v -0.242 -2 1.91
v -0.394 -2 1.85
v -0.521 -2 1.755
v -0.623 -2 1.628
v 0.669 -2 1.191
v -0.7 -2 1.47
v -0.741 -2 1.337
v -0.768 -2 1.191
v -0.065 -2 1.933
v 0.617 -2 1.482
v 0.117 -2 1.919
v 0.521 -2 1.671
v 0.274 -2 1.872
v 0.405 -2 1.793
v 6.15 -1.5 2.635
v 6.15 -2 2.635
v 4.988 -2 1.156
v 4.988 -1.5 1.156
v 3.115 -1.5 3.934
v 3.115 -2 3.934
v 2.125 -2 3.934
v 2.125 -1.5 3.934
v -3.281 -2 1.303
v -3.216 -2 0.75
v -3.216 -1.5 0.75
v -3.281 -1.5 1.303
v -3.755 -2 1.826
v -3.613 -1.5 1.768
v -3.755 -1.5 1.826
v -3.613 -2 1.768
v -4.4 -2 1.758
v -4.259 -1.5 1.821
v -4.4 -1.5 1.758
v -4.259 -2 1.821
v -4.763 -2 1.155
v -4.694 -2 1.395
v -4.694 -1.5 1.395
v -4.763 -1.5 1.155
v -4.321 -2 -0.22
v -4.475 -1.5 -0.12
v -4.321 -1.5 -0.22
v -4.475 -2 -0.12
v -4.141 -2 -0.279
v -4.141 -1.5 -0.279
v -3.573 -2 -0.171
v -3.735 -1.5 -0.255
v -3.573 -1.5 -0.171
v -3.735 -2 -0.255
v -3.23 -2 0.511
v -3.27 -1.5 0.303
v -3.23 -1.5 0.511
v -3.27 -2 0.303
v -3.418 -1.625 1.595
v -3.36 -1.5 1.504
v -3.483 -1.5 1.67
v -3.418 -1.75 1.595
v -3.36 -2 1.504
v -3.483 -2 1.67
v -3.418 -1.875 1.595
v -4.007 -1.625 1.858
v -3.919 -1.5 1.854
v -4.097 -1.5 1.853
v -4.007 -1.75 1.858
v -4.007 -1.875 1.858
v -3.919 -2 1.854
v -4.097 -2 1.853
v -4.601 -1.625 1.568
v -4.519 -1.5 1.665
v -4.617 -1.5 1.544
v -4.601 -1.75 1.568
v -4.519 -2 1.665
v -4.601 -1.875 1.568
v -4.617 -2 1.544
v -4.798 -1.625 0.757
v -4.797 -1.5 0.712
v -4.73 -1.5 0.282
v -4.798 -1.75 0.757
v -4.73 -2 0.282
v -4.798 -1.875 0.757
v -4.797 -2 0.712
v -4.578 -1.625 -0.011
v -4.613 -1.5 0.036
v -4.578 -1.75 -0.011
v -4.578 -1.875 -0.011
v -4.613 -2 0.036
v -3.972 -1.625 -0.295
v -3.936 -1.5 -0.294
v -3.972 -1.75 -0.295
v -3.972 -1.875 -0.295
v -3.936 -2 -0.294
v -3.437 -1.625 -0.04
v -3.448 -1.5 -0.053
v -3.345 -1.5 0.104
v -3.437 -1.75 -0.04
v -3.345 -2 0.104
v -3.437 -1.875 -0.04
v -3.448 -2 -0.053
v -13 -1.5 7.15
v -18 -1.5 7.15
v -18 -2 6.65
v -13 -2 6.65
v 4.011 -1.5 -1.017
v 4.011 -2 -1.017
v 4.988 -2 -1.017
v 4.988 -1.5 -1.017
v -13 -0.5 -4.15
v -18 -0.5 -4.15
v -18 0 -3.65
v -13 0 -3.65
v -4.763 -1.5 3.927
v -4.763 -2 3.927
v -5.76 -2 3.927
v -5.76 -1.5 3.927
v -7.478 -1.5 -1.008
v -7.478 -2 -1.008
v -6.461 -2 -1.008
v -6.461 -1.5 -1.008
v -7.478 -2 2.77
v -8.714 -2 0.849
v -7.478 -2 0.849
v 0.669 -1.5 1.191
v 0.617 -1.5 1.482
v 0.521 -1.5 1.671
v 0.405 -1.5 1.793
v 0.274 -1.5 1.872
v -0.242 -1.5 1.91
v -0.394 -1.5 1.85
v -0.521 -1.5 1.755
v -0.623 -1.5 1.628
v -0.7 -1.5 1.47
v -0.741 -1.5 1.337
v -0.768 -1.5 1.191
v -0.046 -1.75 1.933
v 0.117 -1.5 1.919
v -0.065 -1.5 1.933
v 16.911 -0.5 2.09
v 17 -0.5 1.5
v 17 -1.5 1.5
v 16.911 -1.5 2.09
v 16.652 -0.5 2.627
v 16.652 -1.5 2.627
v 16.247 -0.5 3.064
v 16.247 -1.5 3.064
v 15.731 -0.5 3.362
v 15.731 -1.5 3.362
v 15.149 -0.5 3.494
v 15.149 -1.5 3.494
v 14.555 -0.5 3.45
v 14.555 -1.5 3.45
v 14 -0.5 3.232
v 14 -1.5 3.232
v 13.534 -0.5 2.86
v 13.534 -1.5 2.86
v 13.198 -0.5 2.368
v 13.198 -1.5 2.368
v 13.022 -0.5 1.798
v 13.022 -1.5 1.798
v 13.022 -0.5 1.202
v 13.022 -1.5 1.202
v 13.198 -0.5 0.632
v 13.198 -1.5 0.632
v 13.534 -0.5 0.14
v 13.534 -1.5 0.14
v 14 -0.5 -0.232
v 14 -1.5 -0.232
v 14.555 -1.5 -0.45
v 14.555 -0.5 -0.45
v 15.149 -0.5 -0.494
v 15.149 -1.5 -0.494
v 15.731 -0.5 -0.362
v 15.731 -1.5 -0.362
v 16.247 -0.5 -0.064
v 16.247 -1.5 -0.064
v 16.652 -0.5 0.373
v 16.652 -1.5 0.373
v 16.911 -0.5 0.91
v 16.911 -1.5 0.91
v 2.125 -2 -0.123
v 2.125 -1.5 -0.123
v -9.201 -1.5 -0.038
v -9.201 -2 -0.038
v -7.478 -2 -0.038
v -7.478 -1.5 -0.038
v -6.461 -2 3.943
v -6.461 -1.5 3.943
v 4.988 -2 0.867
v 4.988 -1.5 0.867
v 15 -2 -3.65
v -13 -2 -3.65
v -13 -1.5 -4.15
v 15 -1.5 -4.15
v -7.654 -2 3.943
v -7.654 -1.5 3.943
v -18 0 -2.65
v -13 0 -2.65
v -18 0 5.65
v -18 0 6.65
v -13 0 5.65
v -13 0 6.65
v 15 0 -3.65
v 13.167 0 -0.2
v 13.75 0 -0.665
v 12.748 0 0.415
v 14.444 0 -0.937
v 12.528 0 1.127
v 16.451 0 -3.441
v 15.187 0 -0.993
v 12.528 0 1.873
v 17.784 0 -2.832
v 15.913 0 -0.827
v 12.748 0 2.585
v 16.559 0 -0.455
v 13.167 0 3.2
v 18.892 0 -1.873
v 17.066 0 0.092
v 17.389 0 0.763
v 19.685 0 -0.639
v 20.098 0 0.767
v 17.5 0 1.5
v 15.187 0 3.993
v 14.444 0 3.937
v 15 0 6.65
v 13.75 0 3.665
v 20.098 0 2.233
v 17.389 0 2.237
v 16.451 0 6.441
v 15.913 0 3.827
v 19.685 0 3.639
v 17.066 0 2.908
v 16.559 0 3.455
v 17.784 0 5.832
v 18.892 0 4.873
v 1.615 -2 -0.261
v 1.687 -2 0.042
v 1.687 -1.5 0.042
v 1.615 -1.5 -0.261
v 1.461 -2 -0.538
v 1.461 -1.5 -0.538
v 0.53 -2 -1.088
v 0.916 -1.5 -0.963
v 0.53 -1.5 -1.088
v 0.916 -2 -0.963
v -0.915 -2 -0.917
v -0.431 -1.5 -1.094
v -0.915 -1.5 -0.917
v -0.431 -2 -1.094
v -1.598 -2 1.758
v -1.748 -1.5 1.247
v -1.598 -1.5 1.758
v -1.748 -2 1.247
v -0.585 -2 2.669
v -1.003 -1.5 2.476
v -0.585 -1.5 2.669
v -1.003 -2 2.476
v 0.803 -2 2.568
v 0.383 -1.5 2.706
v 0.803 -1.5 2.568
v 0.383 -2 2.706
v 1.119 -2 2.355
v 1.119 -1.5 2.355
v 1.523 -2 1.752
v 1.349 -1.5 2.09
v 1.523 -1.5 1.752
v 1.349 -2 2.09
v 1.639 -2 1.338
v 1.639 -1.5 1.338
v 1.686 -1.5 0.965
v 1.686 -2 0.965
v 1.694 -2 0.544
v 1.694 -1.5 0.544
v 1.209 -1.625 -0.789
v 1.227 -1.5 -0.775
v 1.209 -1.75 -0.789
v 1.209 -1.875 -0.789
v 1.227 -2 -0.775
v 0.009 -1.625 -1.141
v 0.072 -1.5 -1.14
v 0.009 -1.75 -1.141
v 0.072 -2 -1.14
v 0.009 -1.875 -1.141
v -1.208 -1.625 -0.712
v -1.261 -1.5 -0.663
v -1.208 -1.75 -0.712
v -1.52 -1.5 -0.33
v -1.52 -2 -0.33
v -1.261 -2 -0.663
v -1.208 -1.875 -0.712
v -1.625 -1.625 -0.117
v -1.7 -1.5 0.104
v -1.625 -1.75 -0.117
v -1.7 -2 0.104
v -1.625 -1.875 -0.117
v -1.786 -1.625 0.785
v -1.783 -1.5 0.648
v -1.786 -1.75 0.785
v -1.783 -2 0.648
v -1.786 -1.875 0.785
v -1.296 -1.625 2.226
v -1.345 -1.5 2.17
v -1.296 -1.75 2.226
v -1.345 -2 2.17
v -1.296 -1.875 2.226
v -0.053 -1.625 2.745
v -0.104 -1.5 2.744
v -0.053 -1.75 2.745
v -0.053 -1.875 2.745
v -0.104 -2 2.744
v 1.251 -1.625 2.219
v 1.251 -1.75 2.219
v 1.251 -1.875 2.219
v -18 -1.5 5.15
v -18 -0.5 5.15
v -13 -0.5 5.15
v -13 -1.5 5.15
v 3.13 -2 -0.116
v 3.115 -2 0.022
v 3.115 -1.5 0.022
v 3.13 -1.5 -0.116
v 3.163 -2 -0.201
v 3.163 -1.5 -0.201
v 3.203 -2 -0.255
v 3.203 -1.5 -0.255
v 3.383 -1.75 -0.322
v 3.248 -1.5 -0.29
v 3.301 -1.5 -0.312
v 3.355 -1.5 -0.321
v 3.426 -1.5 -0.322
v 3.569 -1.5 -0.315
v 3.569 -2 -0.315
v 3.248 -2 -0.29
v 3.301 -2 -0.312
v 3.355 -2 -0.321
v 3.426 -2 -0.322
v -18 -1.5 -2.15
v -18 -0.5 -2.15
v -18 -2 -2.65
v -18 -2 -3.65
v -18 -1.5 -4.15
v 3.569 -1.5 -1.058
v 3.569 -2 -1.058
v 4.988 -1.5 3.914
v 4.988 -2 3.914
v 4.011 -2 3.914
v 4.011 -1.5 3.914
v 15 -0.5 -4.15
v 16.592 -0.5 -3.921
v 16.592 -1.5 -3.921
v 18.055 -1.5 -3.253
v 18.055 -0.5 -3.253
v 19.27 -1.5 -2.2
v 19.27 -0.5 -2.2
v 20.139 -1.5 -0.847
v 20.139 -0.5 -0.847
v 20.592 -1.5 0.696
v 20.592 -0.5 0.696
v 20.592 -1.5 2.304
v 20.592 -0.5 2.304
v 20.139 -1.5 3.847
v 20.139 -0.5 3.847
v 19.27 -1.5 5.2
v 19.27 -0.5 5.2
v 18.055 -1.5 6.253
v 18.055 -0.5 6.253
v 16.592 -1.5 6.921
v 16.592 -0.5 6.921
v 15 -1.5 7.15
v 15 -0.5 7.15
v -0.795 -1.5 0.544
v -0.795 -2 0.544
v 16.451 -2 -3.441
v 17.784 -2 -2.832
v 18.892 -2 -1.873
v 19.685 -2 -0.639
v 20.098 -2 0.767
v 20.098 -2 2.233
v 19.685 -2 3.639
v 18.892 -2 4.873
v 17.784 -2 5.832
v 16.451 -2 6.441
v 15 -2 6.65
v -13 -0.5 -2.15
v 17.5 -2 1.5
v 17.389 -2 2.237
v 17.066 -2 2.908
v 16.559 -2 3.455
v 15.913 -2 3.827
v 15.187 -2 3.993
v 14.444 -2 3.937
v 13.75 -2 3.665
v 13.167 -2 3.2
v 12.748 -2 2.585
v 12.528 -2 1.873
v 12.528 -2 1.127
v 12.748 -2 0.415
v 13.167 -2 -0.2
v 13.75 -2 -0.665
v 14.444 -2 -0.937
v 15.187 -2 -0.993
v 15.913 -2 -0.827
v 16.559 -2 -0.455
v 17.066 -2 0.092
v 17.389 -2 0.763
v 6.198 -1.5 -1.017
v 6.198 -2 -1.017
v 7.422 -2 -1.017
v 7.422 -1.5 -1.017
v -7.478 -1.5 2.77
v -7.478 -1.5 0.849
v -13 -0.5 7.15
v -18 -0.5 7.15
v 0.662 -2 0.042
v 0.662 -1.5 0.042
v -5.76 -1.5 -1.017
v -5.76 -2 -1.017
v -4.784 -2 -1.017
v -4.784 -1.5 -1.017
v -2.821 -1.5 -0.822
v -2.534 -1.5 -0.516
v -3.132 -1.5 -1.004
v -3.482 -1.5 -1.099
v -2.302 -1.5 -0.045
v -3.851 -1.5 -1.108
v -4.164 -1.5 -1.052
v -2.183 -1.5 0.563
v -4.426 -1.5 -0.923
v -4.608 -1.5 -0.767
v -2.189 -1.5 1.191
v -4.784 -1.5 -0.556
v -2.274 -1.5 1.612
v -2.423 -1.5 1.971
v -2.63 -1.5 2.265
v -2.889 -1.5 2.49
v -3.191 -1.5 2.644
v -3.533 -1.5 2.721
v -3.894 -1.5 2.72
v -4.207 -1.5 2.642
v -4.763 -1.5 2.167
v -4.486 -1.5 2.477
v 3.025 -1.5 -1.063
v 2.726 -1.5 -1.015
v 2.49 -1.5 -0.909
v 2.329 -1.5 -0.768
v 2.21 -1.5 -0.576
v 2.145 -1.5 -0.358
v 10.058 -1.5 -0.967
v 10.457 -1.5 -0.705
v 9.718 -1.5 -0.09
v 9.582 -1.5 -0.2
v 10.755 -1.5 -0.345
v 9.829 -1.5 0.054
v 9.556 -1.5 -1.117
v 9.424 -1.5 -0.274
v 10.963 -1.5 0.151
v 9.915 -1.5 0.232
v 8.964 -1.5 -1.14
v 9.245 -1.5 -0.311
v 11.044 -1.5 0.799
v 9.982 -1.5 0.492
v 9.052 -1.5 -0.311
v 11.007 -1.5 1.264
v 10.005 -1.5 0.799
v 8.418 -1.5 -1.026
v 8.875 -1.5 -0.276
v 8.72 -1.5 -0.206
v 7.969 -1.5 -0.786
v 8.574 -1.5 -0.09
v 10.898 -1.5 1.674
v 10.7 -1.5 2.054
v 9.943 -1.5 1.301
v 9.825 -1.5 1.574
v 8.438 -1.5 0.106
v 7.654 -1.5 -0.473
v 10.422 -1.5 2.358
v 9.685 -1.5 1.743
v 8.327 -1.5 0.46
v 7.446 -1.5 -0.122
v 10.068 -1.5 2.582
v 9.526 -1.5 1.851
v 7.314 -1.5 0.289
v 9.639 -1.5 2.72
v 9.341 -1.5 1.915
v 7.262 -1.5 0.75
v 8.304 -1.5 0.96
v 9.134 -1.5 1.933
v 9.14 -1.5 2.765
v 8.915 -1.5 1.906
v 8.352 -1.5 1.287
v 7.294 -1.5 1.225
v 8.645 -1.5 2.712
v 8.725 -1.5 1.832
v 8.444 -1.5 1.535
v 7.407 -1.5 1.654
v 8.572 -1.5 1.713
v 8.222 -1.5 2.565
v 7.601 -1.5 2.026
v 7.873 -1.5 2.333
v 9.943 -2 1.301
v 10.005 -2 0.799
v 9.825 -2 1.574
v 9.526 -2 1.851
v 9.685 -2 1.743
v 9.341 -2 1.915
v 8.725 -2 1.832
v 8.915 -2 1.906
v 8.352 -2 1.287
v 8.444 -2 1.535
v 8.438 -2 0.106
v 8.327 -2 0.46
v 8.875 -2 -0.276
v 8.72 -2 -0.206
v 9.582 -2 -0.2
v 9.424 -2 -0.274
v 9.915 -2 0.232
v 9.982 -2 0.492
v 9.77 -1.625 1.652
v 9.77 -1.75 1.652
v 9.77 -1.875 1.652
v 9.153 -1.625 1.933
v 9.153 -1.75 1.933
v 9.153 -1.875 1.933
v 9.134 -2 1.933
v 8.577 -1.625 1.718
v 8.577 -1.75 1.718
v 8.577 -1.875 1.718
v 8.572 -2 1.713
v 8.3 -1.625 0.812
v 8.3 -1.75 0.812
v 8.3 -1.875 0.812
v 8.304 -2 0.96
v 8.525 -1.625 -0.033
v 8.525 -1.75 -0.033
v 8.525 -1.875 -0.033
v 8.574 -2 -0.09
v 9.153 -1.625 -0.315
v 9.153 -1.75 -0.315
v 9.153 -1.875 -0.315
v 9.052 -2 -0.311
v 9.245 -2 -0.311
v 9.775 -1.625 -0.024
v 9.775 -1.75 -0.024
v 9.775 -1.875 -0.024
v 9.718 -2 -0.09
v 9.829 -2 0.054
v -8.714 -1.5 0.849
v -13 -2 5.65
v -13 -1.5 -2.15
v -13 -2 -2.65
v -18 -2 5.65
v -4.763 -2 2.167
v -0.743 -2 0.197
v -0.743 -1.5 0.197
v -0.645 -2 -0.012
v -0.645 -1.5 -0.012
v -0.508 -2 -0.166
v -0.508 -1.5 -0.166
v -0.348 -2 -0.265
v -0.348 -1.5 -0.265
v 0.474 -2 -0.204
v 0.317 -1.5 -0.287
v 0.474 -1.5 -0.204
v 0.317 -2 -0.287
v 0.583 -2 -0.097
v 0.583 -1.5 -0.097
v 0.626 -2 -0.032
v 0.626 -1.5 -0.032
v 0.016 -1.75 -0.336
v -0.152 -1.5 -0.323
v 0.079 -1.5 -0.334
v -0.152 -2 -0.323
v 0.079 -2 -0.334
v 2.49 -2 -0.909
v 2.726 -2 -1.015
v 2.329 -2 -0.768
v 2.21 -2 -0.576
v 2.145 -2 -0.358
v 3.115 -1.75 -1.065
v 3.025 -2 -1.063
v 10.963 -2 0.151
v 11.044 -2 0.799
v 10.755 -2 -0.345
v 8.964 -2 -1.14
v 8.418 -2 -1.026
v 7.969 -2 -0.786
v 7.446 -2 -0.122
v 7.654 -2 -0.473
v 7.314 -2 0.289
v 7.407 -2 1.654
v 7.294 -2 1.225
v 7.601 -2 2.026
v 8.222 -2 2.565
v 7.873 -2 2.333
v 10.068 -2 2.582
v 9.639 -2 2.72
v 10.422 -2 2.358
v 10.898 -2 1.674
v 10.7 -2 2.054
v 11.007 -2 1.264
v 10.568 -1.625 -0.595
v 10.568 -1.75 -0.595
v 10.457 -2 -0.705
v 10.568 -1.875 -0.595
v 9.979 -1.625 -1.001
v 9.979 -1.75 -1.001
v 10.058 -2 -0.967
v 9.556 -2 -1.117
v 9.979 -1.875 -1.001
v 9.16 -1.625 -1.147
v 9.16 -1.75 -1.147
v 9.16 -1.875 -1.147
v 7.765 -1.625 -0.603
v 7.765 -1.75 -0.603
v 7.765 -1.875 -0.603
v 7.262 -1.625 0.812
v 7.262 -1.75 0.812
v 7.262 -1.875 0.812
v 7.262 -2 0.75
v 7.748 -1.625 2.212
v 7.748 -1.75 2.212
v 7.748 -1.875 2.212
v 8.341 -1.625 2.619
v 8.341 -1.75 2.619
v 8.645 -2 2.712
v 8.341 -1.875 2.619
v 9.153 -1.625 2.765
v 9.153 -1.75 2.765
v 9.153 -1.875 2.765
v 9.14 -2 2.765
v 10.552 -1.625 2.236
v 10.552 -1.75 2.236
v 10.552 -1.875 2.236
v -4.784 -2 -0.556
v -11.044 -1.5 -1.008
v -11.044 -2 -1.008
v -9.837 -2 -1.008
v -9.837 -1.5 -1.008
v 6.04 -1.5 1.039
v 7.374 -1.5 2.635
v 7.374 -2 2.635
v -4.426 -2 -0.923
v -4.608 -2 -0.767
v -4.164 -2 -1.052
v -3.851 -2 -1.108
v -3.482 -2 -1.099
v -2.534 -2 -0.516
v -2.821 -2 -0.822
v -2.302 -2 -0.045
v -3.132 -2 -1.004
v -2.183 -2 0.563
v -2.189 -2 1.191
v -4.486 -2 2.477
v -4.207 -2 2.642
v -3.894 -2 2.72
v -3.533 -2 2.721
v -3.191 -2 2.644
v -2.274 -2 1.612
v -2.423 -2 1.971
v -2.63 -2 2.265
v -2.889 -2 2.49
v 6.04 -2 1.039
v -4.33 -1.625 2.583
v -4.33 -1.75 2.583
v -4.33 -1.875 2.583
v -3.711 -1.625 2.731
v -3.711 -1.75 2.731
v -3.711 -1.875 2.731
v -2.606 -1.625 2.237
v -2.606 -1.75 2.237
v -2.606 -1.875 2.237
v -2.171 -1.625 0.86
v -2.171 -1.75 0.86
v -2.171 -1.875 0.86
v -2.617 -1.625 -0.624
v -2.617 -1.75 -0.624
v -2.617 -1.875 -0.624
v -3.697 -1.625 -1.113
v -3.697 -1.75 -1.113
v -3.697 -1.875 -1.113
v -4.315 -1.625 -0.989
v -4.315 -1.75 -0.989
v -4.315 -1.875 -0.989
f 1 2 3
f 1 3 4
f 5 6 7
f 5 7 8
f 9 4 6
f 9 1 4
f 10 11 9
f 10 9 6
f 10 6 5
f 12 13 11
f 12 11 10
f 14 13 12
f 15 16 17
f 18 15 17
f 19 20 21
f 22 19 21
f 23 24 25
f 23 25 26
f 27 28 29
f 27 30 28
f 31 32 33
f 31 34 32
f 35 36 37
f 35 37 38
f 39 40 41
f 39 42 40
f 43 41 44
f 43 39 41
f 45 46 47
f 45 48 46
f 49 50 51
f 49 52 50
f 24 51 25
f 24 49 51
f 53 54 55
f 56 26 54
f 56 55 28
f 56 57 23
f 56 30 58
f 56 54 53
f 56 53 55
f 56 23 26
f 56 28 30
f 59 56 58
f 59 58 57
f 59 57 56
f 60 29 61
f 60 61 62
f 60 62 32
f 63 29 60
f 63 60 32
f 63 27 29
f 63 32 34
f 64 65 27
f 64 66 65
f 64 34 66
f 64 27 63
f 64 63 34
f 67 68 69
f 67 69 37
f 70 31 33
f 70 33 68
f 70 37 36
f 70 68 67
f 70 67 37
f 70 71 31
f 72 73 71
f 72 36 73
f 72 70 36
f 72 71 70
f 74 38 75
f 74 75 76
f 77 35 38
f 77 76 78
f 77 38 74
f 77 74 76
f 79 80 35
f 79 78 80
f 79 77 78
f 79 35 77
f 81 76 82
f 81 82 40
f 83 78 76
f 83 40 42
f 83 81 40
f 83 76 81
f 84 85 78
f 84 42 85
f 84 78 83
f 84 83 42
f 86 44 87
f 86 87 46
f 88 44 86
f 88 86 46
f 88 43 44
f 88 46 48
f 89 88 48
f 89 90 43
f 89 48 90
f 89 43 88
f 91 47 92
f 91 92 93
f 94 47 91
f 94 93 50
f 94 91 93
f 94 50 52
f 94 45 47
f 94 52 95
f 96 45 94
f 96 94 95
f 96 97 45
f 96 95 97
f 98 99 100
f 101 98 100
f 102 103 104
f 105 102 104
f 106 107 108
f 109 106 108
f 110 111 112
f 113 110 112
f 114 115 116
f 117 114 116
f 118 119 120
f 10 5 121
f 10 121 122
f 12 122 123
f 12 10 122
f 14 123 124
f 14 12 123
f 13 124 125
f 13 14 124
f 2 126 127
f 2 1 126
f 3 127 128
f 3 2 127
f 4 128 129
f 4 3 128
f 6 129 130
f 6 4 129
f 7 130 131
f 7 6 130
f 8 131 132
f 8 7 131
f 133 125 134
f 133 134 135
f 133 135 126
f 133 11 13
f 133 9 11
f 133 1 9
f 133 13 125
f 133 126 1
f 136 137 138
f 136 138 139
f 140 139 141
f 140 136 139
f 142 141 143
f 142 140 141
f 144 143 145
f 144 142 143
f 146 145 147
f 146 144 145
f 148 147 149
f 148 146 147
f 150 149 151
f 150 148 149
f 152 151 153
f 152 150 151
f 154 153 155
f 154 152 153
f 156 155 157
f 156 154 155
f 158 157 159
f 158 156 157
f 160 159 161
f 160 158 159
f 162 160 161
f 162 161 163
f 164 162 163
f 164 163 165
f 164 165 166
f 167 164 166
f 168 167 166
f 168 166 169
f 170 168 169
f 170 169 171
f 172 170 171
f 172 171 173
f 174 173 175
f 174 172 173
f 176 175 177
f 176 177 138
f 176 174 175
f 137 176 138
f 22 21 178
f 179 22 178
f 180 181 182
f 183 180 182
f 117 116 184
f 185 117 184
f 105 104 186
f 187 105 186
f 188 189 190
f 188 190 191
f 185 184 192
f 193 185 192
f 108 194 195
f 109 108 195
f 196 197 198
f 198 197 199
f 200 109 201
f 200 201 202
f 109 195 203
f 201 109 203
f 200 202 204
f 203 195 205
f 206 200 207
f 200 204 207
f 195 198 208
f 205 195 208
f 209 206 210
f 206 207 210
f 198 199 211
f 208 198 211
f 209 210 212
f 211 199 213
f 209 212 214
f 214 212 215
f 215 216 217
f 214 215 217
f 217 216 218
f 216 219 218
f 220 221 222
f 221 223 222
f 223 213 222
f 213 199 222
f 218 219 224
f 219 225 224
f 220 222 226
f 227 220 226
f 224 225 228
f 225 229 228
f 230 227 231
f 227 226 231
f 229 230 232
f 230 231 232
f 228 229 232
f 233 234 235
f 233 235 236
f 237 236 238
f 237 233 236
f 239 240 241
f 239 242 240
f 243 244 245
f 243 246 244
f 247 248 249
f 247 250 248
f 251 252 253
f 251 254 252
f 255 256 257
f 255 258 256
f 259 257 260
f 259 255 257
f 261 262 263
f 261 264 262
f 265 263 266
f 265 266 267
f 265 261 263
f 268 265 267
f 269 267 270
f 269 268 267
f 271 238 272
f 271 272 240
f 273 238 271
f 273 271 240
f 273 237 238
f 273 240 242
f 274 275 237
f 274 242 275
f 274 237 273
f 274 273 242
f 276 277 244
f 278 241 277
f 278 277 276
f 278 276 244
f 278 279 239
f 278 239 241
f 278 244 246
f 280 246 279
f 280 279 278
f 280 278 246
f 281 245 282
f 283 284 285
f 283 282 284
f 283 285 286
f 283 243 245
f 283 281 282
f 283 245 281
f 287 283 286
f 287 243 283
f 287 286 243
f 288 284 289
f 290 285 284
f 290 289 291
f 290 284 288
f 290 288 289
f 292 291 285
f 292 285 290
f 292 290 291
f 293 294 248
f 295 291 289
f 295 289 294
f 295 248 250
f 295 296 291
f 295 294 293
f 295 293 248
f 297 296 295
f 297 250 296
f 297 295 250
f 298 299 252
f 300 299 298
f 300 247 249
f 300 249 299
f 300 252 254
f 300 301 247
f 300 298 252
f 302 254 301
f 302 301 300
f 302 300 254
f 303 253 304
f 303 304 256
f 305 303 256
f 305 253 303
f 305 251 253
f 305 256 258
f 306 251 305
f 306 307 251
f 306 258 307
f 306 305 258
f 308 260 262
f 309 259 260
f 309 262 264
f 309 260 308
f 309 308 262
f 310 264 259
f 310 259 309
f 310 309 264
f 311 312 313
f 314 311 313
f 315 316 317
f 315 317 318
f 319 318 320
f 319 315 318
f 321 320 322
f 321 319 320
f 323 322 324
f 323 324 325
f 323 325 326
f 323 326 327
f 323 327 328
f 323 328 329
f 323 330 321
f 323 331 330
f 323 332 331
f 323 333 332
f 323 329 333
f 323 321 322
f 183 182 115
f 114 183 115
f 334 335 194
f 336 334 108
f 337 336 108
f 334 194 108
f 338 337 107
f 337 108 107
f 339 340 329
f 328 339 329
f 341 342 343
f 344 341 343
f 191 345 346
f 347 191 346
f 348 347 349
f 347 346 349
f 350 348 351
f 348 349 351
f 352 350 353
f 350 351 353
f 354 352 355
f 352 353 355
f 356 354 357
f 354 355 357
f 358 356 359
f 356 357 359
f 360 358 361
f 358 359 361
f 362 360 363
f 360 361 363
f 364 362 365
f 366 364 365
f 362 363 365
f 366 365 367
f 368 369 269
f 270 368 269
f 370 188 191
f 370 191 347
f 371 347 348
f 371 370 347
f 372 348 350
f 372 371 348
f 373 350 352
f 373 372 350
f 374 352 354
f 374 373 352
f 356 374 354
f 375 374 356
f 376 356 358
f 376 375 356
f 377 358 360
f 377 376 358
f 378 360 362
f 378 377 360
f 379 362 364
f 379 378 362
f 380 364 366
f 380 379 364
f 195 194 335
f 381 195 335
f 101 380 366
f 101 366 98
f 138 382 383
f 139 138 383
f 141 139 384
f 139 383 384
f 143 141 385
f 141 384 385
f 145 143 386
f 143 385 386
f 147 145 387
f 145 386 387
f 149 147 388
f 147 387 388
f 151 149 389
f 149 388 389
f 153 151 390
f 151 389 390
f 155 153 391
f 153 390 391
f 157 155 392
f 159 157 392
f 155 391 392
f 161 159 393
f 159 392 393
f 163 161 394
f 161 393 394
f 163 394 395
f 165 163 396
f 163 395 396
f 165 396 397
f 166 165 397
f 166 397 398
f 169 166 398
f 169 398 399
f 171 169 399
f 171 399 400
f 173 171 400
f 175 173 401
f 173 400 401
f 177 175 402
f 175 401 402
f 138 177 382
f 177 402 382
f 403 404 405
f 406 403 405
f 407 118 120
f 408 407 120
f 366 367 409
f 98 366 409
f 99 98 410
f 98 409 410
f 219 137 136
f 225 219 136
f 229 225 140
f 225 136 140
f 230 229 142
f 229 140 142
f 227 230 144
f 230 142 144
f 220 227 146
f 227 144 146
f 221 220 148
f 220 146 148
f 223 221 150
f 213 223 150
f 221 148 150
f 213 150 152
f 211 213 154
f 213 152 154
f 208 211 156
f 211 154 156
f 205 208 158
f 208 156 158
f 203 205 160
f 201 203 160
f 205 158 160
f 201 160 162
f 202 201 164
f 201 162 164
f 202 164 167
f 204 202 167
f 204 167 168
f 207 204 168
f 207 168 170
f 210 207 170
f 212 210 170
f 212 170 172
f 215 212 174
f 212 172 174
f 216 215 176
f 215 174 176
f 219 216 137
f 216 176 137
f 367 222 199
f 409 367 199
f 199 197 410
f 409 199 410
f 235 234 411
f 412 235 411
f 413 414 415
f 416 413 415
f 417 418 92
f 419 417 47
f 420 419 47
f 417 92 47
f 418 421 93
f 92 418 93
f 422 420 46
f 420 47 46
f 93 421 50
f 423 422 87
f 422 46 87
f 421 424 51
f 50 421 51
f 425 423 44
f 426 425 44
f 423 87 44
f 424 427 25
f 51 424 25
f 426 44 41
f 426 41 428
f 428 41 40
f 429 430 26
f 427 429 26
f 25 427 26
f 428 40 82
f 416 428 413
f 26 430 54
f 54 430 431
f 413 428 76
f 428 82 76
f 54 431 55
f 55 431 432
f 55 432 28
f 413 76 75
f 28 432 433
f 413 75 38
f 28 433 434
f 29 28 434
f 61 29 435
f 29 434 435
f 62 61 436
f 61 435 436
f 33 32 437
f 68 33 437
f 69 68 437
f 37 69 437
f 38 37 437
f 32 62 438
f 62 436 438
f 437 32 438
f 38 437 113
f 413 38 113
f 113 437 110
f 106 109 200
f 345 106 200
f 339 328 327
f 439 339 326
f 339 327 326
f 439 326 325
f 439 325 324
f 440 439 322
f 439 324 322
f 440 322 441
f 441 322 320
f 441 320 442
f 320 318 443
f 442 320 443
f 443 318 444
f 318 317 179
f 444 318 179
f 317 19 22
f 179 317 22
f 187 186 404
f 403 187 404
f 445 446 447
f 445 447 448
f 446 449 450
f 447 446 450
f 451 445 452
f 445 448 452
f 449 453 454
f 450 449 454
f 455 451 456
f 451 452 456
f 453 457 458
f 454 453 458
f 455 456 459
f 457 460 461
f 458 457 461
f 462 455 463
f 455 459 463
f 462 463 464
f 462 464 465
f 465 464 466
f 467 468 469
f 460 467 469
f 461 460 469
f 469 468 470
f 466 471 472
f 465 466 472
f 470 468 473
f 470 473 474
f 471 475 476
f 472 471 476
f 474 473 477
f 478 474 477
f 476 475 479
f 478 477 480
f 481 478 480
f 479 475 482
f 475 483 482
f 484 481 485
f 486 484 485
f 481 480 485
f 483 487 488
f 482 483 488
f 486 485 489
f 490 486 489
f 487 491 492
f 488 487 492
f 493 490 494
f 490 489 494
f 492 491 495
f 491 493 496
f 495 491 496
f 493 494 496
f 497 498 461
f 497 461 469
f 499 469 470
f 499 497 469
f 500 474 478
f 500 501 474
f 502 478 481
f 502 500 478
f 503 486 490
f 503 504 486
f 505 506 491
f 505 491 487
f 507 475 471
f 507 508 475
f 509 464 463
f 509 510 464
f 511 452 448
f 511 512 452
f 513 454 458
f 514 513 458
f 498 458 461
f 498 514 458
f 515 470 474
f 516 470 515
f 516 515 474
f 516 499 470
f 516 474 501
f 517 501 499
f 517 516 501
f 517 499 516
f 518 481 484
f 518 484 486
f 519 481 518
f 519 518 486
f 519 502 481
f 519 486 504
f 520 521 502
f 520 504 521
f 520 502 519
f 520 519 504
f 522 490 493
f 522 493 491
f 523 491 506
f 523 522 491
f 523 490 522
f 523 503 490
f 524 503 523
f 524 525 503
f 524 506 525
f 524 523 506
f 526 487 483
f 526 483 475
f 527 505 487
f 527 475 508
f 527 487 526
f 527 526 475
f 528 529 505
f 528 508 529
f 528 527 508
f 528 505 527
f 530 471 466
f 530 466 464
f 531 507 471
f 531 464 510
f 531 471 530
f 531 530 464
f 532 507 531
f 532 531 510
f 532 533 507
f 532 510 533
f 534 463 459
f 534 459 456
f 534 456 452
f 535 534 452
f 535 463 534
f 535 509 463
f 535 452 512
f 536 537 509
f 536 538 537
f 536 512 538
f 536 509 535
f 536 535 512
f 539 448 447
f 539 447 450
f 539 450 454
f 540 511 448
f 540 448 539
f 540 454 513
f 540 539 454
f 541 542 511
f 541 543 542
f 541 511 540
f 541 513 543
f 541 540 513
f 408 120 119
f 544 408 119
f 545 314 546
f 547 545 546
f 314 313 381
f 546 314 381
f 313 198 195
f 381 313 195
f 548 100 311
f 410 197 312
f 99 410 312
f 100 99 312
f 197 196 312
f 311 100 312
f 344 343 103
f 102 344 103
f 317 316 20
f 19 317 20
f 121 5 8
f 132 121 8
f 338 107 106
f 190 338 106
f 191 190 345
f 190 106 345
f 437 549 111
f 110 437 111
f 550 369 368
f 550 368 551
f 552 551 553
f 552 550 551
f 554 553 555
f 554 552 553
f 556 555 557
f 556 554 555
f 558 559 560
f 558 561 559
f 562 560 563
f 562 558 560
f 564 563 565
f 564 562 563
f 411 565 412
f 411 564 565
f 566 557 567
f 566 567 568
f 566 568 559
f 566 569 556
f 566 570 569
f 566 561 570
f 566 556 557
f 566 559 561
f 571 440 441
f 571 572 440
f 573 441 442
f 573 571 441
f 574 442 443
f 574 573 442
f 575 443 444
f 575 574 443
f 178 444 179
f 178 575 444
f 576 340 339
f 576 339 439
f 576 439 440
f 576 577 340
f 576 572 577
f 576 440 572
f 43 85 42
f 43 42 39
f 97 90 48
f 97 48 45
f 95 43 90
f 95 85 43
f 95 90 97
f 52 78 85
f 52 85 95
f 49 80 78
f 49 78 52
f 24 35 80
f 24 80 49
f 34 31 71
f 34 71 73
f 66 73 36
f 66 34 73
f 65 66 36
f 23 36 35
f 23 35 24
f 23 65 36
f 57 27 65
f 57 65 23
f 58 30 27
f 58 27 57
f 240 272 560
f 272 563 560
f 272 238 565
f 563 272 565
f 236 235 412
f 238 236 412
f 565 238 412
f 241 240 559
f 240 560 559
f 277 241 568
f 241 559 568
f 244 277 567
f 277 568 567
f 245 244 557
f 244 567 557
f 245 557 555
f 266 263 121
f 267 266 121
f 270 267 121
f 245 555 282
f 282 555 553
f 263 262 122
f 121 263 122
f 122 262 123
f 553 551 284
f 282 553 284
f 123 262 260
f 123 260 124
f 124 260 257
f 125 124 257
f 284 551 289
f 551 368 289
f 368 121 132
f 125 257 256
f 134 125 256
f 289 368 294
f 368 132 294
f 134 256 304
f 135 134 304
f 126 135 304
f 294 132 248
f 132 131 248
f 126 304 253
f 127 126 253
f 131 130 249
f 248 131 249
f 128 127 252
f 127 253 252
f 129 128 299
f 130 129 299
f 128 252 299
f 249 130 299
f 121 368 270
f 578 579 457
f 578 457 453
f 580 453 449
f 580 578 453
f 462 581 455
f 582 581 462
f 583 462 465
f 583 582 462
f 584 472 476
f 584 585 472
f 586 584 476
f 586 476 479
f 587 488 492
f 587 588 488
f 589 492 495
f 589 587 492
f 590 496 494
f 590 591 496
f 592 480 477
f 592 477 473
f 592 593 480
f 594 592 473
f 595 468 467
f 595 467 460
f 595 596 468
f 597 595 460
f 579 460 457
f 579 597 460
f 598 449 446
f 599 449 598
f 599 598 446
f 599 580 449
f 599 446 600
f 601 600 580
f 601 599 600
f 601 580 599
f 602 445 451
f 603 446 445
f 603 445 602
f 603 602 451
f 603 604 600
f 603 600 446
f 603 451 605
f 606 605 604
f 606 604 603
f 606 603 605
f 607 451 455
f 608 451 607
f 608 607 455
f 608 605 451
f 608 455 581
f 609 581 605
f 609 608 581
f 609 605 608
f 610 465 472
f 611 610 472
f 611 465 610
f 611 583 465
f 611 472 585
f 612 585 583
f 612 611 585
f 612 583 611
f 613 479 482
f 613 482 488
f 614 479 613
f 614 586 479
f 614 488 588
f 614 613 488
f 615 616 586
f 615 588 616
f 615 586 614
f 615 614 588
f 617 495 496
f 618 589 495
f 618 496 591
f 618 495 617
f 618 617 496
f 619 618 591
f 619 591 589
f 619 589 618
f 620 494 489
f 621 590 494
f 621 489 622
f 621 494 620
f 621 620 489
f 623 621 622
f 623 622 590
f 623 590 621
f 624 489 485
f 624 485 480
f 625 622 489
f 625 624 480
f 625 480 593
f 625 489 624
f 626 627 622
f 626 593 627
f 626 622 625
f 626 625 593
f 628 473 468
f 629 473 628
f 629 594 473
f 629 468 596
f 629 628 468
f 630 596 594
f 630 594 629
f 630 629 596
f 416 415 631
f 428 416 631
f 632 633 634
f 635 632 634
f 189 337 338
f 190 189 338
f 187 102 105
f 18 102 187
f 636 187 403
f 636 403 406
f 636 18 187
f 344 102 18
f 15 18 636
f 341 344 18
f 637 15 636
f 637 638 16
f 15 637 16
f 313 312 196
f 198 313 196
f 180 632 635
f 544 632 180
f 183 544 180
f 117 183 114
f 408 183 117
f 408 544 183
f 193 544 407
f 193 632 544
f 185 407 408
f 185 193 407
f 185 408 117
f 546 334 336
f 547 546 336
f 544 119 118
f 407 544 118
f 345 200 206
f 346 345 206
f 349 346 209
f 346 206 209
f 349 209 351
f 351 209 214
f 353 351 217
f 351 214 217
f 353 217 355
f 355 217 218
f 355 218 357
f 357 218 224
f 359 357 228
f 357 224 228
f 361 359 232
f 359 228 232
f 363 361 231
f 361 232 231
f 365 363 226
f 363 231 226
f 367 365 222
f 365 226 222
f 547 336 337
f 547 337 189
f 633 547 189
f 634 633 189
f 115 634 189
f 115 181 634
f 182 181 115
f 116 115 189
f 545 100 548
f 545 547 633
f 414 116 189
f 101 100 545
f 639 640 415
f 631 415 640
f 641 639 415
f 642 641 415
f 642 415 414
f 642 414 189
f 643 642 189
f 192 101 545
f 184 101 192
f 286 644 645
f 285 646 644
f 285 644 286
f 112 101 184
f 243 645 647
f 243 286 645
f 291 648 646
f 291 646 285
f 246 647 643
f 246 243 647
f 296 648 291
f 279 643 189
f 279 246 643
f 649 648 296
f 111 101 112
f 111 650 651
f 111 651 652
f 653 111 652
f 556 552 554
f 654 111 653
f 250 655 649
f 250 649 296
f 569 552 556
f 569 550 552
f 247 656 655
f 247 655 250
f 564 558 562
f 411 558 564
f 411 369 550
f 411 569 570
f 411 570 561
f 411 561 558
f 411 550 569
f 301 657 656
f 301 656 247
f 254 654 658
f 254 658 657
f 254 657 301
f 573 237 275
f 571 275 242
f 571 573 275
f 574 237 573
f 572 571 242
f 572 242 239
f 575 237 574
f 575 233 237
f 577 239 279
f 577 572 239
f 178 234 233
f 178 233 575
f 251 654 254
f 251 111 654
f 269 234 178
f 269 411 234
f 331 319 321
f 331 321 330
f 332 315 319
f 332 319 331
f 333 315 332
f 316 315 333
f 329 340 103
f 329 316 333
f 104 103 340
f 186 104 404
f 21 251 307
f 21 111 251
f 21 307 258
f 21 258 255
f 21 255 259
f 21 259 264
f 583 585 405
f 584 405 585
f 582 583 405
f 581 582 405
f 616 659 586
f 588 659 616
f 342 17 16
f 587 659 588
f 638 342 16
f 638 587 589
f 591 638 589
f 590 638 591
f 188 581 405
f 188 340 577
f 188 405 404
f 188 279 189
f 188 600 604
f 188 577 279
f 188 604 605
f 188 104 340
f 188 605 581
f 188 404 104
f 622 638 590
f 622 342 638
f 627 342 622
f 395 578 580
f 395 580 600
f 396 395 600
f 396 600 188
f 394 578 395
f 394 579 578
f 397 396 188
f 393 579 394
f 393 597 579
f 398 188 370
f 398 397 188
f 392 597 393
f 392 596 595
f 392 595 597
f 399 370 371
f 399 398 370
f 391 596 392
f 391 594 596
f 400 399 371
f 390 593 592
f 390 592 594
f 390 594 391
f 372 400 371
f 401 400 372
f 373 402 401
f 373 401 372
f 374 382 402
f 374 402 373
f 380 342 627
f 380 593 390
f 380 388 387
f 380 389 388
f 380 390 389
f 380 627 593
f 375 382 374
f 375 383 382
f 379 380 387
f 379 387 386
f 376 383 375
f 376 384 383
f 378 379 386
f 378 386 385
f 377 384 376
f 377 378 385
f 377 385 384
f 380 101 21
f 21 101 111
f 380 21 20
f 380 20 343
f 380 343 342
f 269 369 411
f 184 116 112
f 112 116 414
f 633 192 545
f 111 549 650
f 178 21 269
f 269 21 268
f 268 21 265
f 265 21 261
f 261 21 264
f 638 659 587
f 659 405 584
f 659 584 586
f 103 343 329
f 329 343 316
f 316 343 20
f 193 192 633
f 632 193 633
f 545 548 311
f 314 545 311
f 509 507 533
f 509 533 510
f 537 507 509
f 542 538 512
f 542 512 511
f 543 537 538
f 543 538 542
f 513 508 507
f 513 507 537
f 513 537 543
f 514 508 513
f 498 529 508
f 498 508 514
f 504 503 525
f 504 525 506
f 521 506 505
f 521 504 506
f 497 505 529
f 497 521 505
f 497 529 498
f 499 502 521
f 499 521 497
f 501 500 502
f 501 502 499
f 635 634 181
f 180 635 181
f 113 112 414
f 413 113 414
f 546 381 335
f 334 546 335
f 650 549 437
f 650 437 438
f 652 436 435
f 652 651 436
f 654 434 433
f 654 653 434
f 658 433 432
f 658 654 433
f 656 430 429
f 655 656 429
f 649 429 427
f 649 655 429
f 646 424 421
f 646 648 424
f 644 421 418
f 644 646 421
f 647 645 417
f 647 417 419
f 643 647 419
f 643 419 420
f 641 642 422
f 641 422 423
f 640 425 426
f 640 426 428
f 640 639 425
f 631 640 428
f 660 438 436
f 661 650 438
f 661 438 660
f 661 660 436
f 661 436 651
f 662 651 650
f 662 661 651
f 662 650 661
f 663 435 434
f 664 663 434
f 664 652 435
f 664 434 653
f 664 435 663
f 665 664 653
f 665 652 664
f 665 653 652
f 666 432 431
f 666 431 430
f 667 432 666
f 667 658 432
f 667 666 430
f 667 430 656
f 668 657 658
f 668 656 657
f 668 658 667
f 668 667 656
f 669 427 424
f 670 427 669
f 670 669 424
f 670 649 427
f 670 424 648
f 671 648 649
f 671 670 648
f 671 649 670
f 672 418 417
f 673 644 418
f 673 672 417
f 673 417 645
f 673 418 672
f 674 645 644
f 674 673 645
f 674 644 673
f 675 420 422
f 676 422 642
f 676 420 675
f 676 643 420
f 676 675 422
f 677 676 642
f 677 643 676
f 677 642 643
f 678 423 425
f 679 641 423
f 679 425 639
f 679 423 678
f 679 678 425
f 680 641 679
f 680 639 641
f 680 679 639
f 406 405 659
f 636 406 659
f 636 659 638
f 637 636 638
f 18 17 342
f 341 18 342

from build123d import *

# Parameters (mm, degrees)
F0_R     = 2
F1_DEPTH = 2
F3_DEPTH = 0.5
F6_DEPTH = 5
F7_SIZE  = 0.49999


# Not quite as in the source:
# - a fillet or chamfer is up to 0.001 mm smaller than in the source, because OpenCascade refuses the exact size
# - a feature names something its author has since deleted; it is built from what else it names


with BuildPart() as f1:
    # F0 (on Front) → F1 (new body)
    with BuildSketch(Plane.XZ):
        with BuildLine():
            Line((-18, 5.15), (-13, 5.15))
            Line((-13, 5.15), (-13, -2.15))
            Line((-13, -2.15), (-18, -2.15))
            Line((-18, -2.15), (-18, -4.15))
            Line((-18, -4.15), (15, -4.15))
            ThreePointArc((15, -4.15), (20.65, 1.5), (15, 7.15))
            Line((15, 7.15), (-18, 7.15))
            Line((-18, 7.15), (-18, 5.15))
        make_face()
        with Locations((15, 1.5)):
            Circle(F0_R, mode=Mode.SUBTRACT)
    extrude(amount=F1_DEPTH)

    # F2 (on face) → F3 (cut)
    with BuildSketch(Plane.XZ.offset(2)):
        Polygon((-6.4611563108, -1.0079550547), (-6.4611104663, 3.943059476), (-7.6544608052, 3.943059476), (-11.0437756499, -1.0079550547), (-9.8374226558, -1.0079550547), (-9.200951568, -0.0383489504), (-7.4783776914, -0.0383489504), (-7.4783776914, -1.0079550547), align=None)
        Polygon((-7.4783776914, 0.8486796922), (-8.7143920972, 0.8486796922), (-7.4783776914, 2.7703563678), align=None, mode=Mode.SUBTRACT)
        with BuildLine():
            add(Edge.make_bspline(
                [(-4.7631894864, 2.1669850315), (-4.5225056976, 2.5245150692), (-4.1993017526, 2.7308727653), (-3.7111148009, 2.7308727653)],
                knots=[0, 0, 0, 0, 1, 1, 1, 1], degree=3))
            Line((-4.7631894864, 2.1669850315), (-4.7631894864, 3.927357724))
            Line((-4.7631894864, 3.927357724), (-5.7603080401, 3.927357724))
            Line((-5.7603080401, 3.927357724), (-5.7603080401, -1.0167973187))
            Line((-5.7603080401, -1.0167973187), (-4.7838195254, -1.0167973187))
            Line((-4.7838195254, -1.0167973187), (-4.7838195254, -0.5561170858))
            add(Edge.make_bspline(
                [(-3.6973614416, -1.1130536425), (-4.1993017526, -1.1130536425), (-4.4812456195, -0.9686490998), (-4.7838195254, -0.5561170858)],
                knots=[0, 0, 0, 0, 1, 1, 1, 1], degree=3))
            add(Edge.make_bspline(
                [(-2.1707958582, 0.8604731979), (-2.1707958582, -0.4666858665), (-2.8515298409, -1.1130536425), (-3.6973614416, -1.1130536425)],
                knots=[0, 0, 0, 0, 1, 1, 1, 1], degree=3))
            add(Edge.make_bspline(
                [(-3.7111148009, 2.7308727653), (-2.8171464425, 2.7308727653), (-2.1707958582, 2.0363281176), (-2.1707958582, 0.8604731979)],
                knots=[0, 0, 0, 0, 1, 1, 1, 1], degree=3))
        make_face()
        with BuildLine():
            add(Edge.make_bspline(
                [(-3.9724286288, -0.2947688745), (-3.5529511683, -0.2947688745), (-3.2159938639, 0.0352945585), (-3.2159938639, 0.7504520535)],
                knots=[0, 0, 0, 0, 1, 1, 1, 1], degree=3))
            add(Edge.make_bspline(
                [(-4.7975728848, 0.7573230027), (-4.7975728848, 0.1109609572), (-4.4881796048, -0.2947688745), (-3.9724286288, -0.2947688745)],
                knots=[0, 0, 0, 0, 1, 1, 1, 1], degree=3))
            add(Edge.make_bspline(
                [(-4.0067547215, 1.8575344459), (-4.5362590569, 1.8575344459), (-4.7975728848, 1.4518218059), (-4.7975728848, 0.7573230027)],
                knots=[0, 0, 0, 0, 1, 1, 1, 1], degree=3))
            add(Edge.make_bspline(
                [(-3.2159938639, 0.7504520535), (-3.2159938639, 1.5275053963), (-3.4910610511, 1.8575344459), (-4.0067547215, 1.8575344459)],
                knots=[0, 0, 0, 0, 1, 1, 1, 1], degree=3))
        make_face(mode=Mode.SUBTRACT)
        with BuildLine():
            add(Edge.make_bspline(
                [(-0.0526639052, 2.744568819), (1.0544242177, 2.744568819), (1.7351582004, 2.0775881956), (1.6938981223, 0.5441058186)],
                knots=[0, 0, 0, 0, 1, 1, 1, 1], degree=3))
            add(Edge.make_bspline(
                [(-1.785529879, 0.7848583742), (-1.785529879, 2.0156980785), (-1.0566591386, 2.744568819), (-0.0526639052, 2.744568819)],
                knots=[0, 0, 0, 0, 1, 1, 1, 1], degree=3))
            add(Edge.make_bspline(
                [(0.0092262119, -1.1405660918), (-0.8434820685, -1.1405660918), (-1.785529879, -0.6386028585), (-1.785529879, 0.7848583742)],
                knots=[0, 0, 0, 0, 1, 1, 1, 1], degree=3))
            add(Edge.make_bspline(
                [(1.6870214426, 0.0421253936), (1.6251313255, -0.5973026665), (1.0337941786, -1.1405660918), (0.0092262119, -1.1405660918)],
                knots=[0, 0, 0, 0, 1, 1, 1, 1], degree=3))
            Line((1.6870214426, 0.0421253936), (0.6624534759, 0.0421253936))
            add(Edge.make_bspline(
                [(0.0160455859, -0.3360690666), (0.2705400398, -0.3360690666), (0.5455499213, -0.2466435779), (0.6624534759, 0.0421253936)],
                knots=[0, 0, 0, 0, 1, 1, 1, 1], degree=3))
            add(Edge.make_bspline(
                [(-0.7953453107, 0.5441058186), (-0.788468631, 0.0352945585), (-0.5202781235, -0.3360690666), (0.0160455859, -0.3360690666)],
                knots=[0, 0, 0, 0, 1, 1, 1, 1], degree=3))
            Line((-0.7953453107, 0.5441058186), (1.6938981223, 0.5441058186))
        make_face()
        with BuildLine():
            add(Edge.make_bspline(
                [(0.6693301556, 1.1905423614), (0.6487001165, 1.6443344535), (0.4011969537, 1.933235228), (-0.0457872255, 1.933235228)],
                knots=[0, 0, 0, 0, 1, 1, 1, 1], degree=3))
            Line((0.6693301556, 1.1905423614), (-0.767838592, 1.1905423614))
            add(Edge.make_bspline(
                [(-0.0457872255, 1.933235228), (-0.4652646861, 1.933235228), (-0.7059484749, 1.6512741694), (-0.767838592, 1.1905423614)],
                knots=[0, 0, 0, 0, 1, 1, 1, 1], degree=3))
        make_face(mode=Mode.SUBTRACT)
        with BuildLine():
            add(Edge.make_bspline(
                [(3.3833837085, -0.3222813238), (3.4383971459, -0.3222813238), (3.5277366761, -0.3222813238), (3.5689967542, -0.3153416079)],
                knots=[0, 0, 0, 0, 1, 1, 1, 1], degree=3))
            add(Edge.make_bspline(
                [(3.1151358953, 0.0215526602), (3.1151358953, -0.2122831017), (3.2183433962, -0.3222813238), (3.3833837085, -0.3222813238)],
                knots=[0, 0, 0, 0, 1, 1, 1, 1], degree=3))
            Line((3.1151358953, 0.0215526602), (3.1151358953, 3.9342344037))
            Line((3.1151358953, 3.9342344037), (2.1249513269, 3.9342344037))
            Line((2.1249513269, 3.9342344037), (2.1249513269, -0.1228518825))
            add(Edge.make_bspline(
                [(3.1151358953, -1.0649283459), (2.3656351158, -1.0649283459), (2.1249513269, -0.6180129335), (2.1249513269, -0.1228518825)],
                knots=[0, 0, 0, 0, 1, 1, 1, 1], degree=3))
            add(Edge.make_bspline(
                [(3.5689967542, -1.0580975107), (3.4177098012, -1.0649283459), (3.2664801539, -1.0649283459), (3.1151358953, -1.0649283459)],
                knots=[0, 0, 0, 0, 1, 1, 1, 1], degree=3))
            Line((3.5689967542, -1.0580975107), (3.5689967542, -0.3153416079))
        make_face()
        Polygon((4.9878276893, 1.1561131185), (4.9878276893, 3.9136043647), (4.0113964803, 3.9136043647), (4.0113964803, -1.0167973187), (4.9878276893, -1.0167973187), (4.9878276893, 0.8673498775), (6.1980660074, -1.0167973187), (7.4220576849, -1.0167973187), (6.0399023747, 1.0392668696), (7.3739782328, 2.6345419441), (6.1499292496, 2.6345419441), align=None)
        with BuildLine():
            add(Edge.make_bspline(
                [(9.1528033491, 2.7652561637), (10.3630416672, 2.7652561637), (11.0437756499, 2.0088213988), (11.0437756499, 0.7985830807)],
                knots=[0, 0, 0, 0, 1, 1, 1, 1], degree=3))
            add(Edge.make_bspline(
                [(7.2617737426, 0.8122791344), (7.2617737426, 1.940054602), (7.928754366, 2.7652561637), (9.1528033491, 2.7652561637)],
                knots=[0, 0, 0, 0, 1, 1, 1, 1], degree=3))
            add(Edge.make_bspline(
                [(9.1596800288, -1.1474141187), (7.9700144441, -1.1474141187), (7.2617737426, -0.3497708508), (7.2617737426, 0.8122791344)],
                knots=[0, 0, 0, 0, 1, 1, 1, 1], degree=3))
            add(Edge.make_bspline(
                [(11.0437756499, 0.7985830807), (11.0437756499, -0.3222813238), (10.4042444396, -1.1474141187), (9.1596800288, -1.1474141187)],
                knots=[0, 0, 0, 0, 1, 1, 1, 1], degree=3))
        make_face()
        with BuildLine():
            add(Edge.make_bspline(
                [(9.1528033491, -0.3153416079), (9.6753736992, -0.3153416079), (10.0053970182, 0.090319457), (10.0053970182, 0.7985830807)],
                knots=[0, 0, 0, 0, 1, 1, 1, 1], degree=3))
            add(Edge.make_bspline(
                [(8.3000950687, 0.8122791344), (8.3000950687, 0.0628528523), (8.6163650284, -0.3153416079), (9.1528033491, -0.3153416079)],
                knots=[0, 0, 0, 0, 1, 1, 1, 1], degree=3))
            add(Edge.make_bspline(
                [(9.1528033491, 1.933235228), (8.7539559276, 1.933235228), (8.3000950687, 1.7337599422), (8.3000950687, 0.8122791344)],
                knots=[0, 0, 0, 0, 1, 1, 1, 1], degree=3))
            add(Edge.make_bspline(
                [(10.0053970182, 0.7985830807), (10.0053970182, 1.5618429502), (9.6615630342, 1.933235228), (9.1528033491, 1.933235228)],
                knots=[0, 0, 0, 0, 1, 1, 1, 1], degree=3))
        make_face(mode=Mode.SUBTRACT)
    extrude(amount=-F3_DEPTH, mode=Mode.SUBTRACT)

    # F4 (on face) + F5 (on face) → F6 (cut)
    with BuildSketch(Plane(origin=(-18, 0, 0), x_dir=(0, -1, 0), z_dir=(-1, 0, 0))):
        Polygon((0.5, 5.15), (0, 5.65), (0, 5.15), align=None)
        Polygon((0, 7.15), (0, 6.65), (0.5, 7.15), align=None)
        Polygon((2, 7.15), (1.5, 7.15), (2, 6.65), align=None)
        Polygon((2, 5.65), (1.5, 5.15), (2, 5.15), align=None)
    with BuildSketch(Plane(origin=(-18, 0, 0), x_dir=(0, -1, 0), z_dir=(-1, 0, 0))):
        Polygon((0, -2.15), (0, -2.65), (0.5, -2.15), align=None)
        Polygon((2, -2.15), (1.5, -2.15), (2, -2.65), align=None)
        Polygon((2, -3.65), (1.5, -4.15), (2, -4.15), align=None)
        Polygon((0.5, -4.15), (0, -3.65), (0, -4.15), align=None)
    extrude(amount=-F6_DEPTH, mode=Mode.SUBTRACT)

    # F7 (size 0.5 in the source; OpenCascade refuses exactly that, so slightly less here)
    f7_edges = [f1.edges().sort_by_distance(p)[0] for p in [
        (1, -2, -4.15),
        (20.65, -2, 1.5),
        (1, -2, 7.15),
        (1, 0, -4.15),
        (13, -2, 1.5),
        (13, 0, 1.5),
    ]]
    chamfer(f7_edges, length=F7_SIZE)


solid = f1.part
